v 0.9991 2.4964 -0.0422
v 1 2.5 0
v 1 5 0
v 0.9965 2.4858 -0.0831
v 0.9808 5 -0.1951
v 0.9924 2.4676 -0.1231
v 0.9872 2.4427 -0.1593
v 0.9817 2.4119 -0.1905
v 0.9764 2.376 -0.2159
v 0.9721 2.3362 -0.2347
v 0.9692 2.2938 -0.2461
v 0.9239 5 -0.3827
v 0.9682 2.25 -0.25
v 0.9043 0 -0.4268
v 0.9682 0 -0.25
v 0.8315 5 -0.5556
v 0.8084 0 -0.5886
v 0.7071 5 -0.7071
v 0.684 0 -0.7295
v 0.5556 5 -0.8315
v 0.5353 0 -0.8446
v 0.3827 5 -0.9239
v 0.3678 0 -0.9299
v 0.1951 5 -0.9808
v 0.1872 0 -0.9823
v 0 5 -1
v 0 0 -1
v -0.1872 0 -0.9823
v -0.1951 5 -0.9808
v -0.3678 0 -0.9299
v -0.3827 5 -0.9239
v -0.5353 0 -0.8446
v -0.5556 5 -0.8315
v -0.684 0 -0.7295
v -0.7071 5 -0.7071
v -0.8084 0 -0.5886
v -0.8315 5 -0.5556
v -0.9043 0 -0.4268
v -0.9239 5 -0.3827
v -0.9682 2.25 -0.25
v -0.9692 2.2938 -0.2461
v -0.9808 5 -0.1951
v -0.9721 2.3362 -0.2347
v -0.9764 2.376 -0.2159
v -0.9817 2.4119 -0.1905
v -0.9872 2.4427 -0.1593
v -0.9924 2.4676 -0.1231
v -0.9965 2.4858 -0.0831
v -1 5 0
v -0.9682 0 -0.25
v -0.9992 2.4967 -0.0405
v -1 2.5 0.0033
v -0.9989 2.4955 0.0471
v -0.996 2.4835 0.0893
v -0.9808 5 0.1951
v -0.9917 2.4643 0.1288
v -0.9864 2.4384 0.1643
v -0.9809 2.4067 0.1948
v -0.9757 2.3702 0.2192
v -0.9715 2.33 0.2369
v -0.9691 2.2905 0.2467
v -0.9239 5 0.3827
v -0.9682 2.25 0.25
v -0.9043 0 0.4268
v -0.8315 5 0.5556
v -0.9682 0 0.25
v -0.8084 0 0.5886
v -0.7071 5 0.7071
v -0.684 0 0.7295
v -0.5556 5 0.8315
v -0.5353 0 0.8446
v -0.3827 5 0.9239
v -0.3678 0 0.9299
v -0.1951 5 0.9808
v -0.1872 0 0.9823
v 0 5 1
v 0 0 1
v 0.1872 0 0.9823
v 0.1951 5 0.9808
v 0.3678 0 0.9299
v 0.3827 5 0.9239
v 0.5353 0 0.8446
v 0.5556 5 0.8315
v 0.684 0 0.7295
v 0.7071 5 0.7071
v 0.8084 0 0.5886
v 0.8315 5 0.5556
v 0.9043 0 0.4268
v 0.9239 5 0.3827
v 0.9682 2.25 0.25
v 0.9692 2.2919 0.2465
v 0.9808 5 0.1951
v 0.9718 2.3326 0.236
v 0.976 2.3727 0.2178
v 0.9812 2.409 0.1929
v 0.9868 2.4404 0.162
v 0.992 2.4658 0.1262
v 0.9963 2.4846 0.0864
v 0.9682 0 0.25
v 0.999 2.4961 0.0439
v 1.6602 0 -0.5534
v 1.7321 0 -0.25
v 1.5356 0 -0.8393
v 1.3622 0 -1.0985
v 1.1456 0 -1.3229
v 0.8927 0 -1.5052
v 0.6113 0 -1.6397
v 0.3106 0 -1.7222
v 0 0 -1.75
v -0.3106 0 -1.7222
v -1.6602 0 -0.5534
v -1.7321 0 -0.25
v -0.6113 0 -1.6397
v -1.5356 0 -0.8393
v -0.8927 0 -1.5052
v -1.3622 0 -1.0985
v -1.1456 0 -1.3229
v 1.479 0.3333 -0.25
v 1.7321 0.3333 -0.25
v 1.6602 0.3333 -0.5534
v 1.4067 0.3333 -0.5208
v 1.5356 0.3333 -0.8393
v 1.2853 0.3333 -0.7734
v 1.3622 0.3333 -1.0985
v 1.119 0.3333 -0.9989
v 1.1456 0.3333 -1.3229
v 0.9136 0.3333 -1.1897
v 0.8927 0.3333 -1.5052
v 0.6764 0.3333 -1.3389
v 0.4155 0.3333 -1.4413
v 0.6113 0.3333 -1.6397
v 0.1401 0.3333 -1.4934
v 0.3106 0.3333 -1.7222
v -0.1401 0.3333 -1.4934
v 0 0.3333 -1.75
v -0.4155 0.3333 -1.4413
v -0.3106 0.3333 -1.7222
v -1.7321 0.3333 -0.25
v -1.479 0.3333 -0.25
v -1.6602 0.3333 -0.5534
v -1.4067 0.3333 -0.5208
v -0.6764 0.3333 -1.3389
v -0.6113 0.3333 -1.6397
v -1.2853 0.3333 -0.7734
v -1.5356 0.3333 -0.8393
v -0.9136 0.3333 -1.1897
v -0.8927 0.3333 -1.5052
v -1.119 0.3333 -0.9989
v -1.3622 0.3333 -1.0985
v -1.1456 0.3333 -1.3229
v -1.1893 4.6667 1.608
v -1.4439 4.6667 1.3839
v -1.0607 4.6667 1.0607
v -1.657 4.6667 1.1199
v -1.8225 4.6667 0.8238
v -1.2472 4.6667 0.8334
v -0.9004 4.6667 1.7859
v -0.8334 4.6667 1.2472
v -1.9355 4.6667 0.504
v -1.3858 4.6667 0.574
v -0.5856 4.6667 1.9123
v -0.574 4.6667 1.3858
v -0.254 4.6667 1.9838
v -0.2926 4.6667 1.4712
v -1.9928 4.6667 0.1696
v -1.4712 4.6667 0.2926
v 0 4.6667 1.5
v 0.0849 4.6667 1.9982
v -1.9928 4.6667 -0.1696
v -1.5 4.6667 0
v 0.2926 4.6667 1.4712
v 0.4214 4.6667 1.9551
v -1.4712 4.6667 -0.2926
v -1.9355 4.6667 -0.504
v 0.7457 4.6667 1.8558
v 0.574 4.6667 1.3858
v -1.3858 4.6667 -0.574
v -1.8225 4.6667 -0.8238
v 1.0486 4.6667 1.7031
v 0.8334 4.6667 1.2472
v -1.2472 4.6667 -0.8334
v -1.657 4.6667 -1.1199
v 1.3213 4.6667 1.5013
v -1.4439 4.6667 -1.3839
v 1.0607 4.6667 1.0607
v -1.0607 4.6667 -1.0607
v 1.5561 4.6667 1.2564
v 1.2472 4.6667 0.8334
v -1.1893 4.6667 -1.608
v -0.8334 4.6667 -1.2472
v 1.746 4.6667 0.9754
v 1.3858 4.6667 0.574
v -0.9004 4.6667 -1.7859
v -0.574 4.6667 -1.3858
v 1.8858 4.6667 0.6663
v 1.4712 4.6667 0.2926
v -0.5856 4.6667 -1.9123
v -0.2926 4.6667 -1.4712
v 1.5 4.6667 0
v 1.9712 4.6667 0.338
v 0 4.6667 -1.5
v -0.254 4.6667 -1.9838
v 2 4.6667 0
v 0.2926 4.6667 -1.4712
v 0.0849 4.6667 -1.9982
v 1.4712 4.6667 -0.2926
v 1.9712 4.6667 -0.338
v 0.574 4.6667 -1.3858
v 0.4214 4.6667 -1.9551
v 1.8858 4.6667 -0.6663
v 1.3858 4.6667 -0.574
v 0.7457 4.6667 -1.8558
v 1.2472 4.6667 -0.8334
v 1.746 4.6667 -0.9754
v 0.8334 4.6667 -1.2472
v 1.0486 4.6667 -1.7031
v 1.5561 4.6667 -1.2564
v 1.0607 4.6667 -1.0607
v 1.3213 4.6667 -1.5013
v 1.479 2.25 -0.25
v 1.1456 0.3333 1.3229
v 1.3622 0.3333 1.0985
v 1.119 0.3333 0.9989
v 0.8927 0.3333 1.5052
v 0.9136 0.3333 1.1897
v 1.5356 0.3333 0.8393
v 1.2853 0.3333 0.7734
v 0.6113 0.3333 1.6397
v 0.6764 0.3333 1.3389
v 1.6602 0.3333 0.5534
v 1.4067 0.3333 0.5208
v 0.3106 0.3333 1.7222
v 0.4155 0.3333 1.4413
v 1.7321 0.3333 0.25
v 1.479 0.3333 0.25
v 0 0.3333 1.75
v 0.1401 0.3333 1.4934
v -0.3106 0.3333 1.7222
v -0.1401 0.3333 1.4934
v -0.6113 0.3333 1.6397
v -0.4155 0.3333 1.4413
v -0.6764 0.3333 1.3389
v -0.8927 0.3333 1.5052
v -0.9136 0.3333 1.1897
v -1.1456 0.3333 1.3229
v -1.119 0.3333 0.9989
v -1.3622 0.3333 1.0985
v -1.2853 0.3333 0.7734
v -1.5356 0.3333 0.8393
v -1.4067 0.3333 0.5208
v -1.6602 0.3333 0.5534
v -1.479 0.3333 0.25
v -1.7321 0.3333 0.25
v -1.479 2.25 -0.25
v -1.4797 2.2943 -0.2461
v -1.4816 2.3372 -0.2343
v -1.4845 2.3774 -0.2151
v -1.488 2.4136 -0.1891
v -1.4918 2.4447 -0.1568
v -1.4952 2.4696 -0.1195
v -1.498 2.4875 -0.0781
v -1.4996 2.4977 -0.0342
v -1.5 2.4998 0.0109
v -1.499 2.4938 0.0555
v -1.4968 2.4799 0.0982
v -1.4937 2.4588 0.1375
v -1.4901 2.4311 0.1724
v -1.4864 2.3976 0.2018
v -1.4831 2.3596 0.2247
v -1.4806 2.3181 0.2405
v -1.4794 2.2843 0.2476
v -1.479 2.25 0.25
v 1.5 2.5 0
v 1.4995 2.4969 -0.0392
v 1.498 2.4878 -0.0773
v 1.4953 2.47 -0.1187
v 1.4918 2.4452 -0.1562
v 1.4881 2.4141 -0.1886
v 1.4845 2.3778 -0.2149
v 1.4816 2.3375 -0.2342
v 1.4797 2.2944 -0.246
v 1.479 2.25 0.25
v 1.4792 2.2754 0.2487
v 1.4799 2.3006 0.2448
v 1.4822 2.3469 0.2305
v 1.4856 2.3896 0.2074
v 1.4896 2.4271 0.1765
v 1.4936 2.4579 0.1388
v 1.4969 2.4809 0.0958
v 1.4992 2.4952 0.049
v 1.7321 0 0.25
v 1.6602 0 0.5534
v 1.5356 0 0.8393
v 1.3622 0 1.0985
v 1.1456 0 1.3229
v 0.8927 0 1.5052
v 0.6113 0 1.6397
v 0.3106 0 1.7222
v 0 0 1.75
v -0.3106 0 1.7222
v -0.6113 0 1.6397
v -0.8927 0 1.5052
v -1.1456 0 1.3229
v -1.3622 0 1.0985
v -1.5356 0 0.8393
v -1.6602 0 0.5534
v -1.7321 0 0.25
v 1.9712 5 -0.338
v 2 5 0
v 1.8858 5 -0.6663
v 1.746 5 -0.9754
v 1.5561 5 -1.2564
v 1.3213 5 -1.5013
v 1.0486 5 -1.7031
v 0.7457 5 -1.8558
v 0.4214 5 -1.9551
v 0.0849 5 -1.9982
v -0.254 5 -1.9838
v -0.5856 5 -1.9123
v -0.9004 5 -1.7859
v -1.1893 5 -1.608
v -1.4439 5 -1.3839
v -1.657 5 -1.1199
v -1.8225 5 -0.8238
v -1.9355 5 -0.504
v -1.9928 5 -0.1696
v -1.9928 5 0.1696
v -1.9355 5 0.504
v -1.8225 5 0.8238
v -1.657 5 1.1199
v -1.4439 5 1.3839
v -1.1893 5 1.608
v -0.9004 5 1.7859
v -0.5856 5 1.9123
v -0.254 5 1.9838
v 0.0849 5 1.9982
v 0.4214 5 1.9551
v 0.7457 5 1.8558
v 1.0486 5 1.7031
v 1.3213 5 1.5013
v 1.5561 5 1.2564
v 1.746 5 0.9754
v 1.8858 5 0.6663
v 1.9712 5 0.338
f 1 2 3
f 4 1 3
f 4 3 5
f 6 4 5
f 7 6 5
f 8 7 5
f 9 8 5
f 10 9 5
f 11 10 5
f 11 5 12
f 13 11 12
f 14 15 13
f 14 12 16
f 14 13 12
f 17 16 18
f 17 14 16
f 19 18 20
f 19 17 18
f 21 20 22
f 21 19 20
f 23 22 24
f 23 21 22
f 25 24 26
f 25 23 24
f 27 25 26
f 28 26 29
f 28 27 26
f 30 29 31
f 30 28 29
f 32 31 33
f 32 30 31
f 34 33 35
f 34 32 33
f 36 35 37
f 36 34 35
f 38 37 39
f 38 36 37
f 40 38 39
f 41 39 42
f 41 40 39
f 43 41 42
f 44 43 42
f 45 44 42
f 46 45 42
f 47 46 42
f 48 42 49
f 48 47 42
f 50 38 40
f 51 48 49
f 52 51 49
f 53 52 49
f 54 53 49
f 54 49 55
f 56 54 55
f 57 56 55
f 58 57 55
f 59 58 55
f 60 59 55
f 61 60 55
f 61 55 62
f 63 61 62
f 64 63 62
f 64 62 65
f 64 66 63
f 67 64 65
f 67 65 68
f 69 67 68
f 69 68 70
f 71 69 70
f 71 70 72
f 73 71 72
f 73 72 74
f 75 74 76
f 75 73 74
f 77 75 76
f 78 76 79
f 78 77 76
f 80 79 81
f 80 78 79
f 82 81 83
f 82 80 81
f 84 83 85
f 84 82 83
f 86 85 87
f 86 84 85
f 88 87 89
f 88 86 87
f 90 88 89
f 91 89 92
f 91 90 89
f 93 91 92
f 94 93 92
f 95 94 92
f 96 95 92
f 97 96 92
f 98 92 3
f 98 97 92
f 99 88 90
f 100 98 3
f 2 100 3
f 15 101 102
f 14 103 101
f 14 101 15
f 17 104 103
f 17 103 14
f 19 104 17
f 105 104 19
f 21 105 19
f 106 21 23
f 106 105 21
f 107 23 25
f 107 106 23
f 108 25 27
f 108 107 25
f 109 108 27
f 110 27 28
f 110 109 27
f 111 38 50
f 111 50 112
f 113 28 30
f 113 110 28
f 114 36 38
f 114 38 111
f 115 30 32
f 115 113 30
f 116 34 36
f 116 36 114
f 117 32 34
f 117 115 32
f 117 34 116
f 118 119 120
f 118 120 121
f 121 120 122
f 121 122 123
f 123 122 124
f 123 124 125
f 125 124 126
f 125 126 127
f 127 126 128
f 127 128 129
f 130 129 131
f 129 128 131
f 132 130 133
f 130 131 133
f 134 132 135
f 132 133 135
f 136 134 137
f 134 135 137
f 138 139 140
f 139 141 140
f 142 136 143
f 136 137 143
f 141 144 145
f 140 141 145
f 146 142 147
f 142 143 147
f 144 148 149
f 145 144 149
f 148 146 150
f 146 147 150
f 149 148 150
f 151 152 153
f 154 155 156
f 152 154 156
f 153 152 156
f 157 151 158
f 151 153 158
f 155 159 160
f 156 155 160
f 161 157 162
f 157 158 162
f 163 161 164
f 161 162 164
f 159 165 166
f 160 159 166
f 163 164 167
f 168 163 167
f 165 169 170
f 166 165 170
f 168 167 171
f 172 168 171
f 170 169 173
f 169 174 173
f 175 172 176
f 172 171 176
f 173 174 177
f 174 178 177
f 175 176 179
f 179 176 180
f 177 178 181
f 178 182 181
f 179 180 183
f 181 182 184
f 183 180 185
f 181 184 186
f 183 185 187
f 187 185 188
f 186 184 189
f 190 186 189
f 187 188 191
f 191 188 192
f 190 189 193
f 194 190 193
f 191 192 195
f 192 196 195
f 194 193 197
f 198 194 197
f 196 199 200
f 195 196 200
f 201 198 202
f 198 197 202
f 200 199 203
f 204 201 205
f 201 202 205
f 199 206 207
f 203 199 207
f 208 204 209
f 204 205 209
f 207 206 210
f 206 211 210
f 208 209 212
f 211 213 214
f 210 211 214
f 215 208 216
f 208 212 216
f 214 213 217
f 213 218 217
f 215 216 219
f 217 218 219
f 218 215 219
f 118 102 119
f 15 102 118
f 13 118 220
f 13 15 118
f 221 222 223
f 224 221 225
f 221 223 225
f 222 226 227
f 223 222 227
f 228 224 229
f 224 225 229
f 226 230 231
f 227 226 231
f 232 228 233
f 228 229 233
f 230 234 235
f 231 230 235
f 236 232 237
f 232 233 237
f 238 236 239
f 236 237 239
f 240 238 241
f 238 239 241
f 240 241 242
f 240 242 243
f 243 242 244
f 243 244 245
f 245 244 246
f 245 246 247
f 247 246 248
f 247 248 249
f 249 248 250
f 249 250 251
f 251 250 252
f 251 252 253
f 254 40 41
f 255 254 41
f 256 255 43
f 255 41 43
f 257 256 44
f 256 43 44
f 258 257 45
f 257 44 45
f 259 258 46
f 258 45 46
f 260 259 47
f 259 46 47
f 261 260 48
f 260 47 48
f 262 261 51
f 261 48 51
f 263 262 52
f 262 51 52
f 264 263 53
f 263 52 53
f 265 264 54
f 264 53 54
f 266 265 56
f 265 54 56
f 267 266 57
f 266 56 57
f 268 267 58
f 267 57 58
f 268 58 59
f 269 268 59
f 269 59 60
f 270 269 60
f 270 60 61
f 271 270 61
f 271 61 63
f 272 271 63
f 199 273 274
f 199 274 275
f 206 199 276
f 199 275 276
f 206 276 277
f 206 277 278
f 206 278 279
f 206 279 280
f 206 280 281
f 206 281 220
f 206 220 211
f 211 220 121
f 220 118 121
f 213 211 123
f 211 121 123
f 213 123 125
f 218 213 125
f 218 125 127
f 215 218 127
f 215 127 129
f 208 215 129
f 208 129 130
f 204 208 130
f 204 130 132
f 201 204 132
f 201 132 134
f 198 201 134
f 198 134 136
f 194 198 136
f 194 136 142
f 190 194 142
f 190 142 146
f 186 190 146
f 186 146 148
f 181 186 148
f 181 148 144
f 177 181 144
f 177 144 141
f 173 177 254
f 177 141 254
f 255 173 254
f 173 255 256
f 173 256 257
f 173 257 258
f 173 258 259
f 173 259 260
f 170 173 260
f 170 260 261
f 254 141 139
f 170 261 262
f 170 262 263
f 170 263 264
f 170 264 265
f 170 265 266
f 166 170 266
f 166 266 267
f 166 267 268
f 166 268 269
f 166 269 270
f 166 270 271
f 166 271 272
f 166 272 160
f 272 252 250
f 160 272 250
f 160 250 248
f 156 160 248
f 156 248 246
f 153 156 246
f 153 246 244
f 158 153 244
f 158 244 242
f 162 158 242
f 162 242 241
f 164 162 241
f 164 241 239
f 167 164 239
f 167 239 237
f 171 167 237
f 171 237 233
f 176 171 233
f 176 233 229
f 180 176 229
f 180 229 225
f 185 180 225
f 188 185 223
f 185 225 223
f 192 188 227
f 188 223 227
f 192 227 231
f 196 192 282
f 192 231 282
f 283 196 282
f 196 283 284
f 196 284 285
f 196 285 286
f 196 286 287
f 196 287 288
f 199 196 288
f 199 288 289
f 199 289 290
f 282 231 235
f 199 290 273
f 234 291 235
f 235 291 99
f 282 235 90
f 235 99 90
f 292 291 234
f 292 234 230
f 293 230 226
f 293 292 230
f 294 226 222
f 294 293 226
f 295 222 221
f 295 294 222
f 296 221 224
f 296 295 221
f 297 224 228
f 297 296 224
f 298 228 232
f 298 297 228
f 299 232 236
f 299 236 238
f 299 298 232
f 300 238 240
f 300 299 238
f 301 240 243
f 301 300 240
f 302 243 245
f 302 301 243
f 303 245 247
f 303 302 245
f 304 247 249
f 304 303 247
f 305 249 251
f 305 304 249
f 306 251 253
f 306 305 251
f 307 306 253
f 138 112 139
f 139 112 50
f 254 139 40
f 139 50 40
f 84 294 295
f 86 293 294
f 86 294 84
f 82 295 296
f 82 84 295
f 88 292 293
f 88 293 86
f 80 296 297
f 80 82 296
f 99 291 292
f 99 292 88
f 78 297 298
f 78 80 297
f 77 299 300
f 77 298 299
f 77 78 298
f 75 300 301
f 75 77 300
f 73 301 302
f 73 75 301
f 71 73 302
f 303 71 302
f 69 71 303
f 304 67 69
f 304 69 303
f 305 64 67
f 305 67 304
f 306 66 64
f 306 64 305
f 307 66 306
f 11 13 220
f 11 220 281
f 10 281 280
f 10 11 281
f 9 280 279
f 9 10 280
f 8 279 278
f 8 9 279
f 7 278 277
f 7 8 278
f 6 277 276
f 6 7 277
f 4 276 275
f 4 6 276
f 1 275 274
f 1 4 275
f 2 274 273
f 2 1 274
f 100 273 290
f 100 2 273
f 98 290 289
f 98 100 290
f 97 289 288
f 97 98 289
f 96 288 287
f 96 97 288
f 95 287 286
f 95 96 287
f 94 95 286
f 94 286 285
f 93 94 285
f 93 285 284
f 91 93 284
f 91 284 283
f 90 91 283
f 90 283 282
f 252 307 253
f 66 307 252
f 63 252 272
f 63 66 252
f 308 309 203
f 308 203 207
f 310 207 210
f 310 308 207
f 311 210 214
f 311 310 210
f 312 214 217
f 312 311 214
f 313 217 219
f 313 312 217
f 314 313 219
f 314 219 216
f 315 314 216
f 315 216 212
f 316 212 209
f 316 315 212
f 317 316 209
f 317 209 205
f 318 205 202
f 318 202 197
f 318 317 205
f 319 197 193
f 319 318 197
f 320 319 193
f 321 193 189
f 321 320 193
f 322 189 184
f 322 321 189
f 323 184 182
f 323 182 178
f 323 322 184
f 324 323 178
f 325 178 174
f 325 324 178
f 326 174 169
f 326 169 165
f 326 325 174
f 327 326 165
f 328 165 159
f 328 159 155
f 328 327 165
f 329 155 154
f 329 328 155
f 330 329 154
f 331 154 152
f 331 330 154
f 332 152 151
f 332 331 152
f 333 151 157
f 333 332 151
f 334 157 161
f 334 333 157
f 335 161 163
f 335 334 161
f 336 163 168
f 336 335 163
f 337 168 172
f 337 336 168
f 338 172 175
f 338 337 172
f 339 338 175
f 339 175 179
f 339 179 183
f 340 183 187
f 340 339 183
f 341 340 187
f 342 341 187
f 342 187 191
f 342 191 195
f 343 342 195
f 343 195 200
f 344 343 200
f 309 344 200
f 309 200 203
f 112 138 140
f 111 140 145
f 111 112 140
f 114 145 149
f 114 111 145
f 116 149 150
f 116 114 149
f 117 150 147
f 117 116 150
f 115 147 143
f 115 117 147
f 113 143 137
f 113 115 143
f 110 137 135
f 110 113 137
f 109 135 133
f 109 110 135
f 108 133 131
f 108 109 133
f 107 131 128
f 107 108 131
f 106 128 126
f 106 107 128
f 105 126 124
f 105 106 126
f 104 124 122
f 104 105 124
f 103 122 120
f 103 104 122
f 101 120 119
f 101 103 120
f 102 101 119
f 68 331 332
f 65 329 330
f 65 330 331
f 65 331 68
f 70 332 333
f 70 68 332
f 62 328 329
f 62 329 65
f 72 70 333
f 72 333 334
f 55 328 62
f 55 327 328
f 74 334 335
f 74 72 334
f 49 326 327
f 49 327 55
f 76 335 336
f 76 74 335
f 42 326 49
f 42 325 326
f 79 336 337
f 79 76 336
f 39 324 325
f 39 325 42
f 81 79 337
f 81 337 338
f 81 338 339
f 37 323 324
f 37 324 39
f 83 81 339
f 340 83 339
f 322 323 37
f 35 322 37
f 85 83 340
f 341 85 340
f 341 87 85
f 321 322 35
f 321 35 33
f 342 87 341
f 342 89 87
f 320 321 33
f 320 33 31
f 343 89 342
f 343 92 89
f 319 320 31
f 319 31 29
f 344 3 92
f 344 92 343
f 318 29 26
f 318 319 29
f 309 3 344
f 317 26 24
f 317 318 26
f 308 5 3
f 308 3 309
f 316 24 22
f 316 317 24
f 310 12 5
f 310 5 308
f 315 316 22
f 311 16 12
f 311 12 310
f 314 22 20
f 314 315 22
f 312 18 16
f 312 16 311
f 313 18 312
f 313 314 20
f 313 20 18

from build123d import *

# Parameters (mm, degrees)
SKETCH1_R               = 1.5
SKETCH1_R_2             = 1
BOSS_EXTRUDE1_DEPTH     = 5
SKETCH2_R               = 2
SKETCH2_R_2             = 1
BOSS_EXTRUDE2_DEPTH     = 0.333333333
SKETCH3_R               = 1.75
SKETCH3_R_2             = 1
BOSS_EXTRUDE4_DEPTH     = 0.333333333
SKETCH4_R               = 0.25
SKETCH4_W               = 0.5
SKETCH4_H               = 2.25
CUT_EXTRUDE1_DEPTH      = 3
CUT_EXTRUDE1_DEPTH_BACK = 3


with BuildPart() as part:
    # Sketch1 → Boss-Extrude1 (new body)
    with BuildSketch(Plane(origin=(0, 0, 0), x_dir=(1, 0, 0), z_dir=(0, 1, 0))):
        Circle(SKETCH1_R)
        Circle(SKETCH1_R_2, mode=Mode.SUBTRACT)
    extrude(amount=BOSS_EXTRUDE1_DEPTH)

    # Sketch2 → Boss-Extrude2 (add)
    with BuildSketch(Plane(origin=(0, 5, 0), x_dir=(1, 0, 0), z_dir=(0, 1, 0))):
        Circle(SKETCH2_R)
        Circle(SKETCH2_R_2, mode=Mode.SUBTRACT)
    extrude(amount=-BOSS_EXTRUDE2_DEPTH)

    # Sketch3 → Boss-Extrude4 (add)
    with BuildSketch(Plane(origin=(0, 0, 0), x_dir=(-1, 0, 0), z_dir=(0, -1, 0))):
        Circle(SKETCH3_R)
        Circle(SKETCH3_R_2, mode=Mode.SUBTRACT)
    extrude(amount=-BOSS_EXTRUDE4_DEPTH)

    # Sketch4 → Cut-Extrude1 (cut, two sides)
    with BuildSketch(Plane(origin=(0, 0, 0), x_dir=(0, 0, -1), z_dir=(1, 0, 0))) as cut_extrude1_sk:
        with Locations((0, 2.25)):
            Circle(SKETCH4_R)
        with Locations((0, 1.125)):
            Rectangle(SKETCH4_W, SKETCH4_H)
    extrude(amount=CUT_EXTRUDE1_DEPTH, mode=Mode.SUBTRACT)
    extrude(cut_extrude1_sk.sketch, amount=-CUT_EXTRUDE1_DEPTH_BACK, mode=Mode.SUBTRACT)


solid = part.part
